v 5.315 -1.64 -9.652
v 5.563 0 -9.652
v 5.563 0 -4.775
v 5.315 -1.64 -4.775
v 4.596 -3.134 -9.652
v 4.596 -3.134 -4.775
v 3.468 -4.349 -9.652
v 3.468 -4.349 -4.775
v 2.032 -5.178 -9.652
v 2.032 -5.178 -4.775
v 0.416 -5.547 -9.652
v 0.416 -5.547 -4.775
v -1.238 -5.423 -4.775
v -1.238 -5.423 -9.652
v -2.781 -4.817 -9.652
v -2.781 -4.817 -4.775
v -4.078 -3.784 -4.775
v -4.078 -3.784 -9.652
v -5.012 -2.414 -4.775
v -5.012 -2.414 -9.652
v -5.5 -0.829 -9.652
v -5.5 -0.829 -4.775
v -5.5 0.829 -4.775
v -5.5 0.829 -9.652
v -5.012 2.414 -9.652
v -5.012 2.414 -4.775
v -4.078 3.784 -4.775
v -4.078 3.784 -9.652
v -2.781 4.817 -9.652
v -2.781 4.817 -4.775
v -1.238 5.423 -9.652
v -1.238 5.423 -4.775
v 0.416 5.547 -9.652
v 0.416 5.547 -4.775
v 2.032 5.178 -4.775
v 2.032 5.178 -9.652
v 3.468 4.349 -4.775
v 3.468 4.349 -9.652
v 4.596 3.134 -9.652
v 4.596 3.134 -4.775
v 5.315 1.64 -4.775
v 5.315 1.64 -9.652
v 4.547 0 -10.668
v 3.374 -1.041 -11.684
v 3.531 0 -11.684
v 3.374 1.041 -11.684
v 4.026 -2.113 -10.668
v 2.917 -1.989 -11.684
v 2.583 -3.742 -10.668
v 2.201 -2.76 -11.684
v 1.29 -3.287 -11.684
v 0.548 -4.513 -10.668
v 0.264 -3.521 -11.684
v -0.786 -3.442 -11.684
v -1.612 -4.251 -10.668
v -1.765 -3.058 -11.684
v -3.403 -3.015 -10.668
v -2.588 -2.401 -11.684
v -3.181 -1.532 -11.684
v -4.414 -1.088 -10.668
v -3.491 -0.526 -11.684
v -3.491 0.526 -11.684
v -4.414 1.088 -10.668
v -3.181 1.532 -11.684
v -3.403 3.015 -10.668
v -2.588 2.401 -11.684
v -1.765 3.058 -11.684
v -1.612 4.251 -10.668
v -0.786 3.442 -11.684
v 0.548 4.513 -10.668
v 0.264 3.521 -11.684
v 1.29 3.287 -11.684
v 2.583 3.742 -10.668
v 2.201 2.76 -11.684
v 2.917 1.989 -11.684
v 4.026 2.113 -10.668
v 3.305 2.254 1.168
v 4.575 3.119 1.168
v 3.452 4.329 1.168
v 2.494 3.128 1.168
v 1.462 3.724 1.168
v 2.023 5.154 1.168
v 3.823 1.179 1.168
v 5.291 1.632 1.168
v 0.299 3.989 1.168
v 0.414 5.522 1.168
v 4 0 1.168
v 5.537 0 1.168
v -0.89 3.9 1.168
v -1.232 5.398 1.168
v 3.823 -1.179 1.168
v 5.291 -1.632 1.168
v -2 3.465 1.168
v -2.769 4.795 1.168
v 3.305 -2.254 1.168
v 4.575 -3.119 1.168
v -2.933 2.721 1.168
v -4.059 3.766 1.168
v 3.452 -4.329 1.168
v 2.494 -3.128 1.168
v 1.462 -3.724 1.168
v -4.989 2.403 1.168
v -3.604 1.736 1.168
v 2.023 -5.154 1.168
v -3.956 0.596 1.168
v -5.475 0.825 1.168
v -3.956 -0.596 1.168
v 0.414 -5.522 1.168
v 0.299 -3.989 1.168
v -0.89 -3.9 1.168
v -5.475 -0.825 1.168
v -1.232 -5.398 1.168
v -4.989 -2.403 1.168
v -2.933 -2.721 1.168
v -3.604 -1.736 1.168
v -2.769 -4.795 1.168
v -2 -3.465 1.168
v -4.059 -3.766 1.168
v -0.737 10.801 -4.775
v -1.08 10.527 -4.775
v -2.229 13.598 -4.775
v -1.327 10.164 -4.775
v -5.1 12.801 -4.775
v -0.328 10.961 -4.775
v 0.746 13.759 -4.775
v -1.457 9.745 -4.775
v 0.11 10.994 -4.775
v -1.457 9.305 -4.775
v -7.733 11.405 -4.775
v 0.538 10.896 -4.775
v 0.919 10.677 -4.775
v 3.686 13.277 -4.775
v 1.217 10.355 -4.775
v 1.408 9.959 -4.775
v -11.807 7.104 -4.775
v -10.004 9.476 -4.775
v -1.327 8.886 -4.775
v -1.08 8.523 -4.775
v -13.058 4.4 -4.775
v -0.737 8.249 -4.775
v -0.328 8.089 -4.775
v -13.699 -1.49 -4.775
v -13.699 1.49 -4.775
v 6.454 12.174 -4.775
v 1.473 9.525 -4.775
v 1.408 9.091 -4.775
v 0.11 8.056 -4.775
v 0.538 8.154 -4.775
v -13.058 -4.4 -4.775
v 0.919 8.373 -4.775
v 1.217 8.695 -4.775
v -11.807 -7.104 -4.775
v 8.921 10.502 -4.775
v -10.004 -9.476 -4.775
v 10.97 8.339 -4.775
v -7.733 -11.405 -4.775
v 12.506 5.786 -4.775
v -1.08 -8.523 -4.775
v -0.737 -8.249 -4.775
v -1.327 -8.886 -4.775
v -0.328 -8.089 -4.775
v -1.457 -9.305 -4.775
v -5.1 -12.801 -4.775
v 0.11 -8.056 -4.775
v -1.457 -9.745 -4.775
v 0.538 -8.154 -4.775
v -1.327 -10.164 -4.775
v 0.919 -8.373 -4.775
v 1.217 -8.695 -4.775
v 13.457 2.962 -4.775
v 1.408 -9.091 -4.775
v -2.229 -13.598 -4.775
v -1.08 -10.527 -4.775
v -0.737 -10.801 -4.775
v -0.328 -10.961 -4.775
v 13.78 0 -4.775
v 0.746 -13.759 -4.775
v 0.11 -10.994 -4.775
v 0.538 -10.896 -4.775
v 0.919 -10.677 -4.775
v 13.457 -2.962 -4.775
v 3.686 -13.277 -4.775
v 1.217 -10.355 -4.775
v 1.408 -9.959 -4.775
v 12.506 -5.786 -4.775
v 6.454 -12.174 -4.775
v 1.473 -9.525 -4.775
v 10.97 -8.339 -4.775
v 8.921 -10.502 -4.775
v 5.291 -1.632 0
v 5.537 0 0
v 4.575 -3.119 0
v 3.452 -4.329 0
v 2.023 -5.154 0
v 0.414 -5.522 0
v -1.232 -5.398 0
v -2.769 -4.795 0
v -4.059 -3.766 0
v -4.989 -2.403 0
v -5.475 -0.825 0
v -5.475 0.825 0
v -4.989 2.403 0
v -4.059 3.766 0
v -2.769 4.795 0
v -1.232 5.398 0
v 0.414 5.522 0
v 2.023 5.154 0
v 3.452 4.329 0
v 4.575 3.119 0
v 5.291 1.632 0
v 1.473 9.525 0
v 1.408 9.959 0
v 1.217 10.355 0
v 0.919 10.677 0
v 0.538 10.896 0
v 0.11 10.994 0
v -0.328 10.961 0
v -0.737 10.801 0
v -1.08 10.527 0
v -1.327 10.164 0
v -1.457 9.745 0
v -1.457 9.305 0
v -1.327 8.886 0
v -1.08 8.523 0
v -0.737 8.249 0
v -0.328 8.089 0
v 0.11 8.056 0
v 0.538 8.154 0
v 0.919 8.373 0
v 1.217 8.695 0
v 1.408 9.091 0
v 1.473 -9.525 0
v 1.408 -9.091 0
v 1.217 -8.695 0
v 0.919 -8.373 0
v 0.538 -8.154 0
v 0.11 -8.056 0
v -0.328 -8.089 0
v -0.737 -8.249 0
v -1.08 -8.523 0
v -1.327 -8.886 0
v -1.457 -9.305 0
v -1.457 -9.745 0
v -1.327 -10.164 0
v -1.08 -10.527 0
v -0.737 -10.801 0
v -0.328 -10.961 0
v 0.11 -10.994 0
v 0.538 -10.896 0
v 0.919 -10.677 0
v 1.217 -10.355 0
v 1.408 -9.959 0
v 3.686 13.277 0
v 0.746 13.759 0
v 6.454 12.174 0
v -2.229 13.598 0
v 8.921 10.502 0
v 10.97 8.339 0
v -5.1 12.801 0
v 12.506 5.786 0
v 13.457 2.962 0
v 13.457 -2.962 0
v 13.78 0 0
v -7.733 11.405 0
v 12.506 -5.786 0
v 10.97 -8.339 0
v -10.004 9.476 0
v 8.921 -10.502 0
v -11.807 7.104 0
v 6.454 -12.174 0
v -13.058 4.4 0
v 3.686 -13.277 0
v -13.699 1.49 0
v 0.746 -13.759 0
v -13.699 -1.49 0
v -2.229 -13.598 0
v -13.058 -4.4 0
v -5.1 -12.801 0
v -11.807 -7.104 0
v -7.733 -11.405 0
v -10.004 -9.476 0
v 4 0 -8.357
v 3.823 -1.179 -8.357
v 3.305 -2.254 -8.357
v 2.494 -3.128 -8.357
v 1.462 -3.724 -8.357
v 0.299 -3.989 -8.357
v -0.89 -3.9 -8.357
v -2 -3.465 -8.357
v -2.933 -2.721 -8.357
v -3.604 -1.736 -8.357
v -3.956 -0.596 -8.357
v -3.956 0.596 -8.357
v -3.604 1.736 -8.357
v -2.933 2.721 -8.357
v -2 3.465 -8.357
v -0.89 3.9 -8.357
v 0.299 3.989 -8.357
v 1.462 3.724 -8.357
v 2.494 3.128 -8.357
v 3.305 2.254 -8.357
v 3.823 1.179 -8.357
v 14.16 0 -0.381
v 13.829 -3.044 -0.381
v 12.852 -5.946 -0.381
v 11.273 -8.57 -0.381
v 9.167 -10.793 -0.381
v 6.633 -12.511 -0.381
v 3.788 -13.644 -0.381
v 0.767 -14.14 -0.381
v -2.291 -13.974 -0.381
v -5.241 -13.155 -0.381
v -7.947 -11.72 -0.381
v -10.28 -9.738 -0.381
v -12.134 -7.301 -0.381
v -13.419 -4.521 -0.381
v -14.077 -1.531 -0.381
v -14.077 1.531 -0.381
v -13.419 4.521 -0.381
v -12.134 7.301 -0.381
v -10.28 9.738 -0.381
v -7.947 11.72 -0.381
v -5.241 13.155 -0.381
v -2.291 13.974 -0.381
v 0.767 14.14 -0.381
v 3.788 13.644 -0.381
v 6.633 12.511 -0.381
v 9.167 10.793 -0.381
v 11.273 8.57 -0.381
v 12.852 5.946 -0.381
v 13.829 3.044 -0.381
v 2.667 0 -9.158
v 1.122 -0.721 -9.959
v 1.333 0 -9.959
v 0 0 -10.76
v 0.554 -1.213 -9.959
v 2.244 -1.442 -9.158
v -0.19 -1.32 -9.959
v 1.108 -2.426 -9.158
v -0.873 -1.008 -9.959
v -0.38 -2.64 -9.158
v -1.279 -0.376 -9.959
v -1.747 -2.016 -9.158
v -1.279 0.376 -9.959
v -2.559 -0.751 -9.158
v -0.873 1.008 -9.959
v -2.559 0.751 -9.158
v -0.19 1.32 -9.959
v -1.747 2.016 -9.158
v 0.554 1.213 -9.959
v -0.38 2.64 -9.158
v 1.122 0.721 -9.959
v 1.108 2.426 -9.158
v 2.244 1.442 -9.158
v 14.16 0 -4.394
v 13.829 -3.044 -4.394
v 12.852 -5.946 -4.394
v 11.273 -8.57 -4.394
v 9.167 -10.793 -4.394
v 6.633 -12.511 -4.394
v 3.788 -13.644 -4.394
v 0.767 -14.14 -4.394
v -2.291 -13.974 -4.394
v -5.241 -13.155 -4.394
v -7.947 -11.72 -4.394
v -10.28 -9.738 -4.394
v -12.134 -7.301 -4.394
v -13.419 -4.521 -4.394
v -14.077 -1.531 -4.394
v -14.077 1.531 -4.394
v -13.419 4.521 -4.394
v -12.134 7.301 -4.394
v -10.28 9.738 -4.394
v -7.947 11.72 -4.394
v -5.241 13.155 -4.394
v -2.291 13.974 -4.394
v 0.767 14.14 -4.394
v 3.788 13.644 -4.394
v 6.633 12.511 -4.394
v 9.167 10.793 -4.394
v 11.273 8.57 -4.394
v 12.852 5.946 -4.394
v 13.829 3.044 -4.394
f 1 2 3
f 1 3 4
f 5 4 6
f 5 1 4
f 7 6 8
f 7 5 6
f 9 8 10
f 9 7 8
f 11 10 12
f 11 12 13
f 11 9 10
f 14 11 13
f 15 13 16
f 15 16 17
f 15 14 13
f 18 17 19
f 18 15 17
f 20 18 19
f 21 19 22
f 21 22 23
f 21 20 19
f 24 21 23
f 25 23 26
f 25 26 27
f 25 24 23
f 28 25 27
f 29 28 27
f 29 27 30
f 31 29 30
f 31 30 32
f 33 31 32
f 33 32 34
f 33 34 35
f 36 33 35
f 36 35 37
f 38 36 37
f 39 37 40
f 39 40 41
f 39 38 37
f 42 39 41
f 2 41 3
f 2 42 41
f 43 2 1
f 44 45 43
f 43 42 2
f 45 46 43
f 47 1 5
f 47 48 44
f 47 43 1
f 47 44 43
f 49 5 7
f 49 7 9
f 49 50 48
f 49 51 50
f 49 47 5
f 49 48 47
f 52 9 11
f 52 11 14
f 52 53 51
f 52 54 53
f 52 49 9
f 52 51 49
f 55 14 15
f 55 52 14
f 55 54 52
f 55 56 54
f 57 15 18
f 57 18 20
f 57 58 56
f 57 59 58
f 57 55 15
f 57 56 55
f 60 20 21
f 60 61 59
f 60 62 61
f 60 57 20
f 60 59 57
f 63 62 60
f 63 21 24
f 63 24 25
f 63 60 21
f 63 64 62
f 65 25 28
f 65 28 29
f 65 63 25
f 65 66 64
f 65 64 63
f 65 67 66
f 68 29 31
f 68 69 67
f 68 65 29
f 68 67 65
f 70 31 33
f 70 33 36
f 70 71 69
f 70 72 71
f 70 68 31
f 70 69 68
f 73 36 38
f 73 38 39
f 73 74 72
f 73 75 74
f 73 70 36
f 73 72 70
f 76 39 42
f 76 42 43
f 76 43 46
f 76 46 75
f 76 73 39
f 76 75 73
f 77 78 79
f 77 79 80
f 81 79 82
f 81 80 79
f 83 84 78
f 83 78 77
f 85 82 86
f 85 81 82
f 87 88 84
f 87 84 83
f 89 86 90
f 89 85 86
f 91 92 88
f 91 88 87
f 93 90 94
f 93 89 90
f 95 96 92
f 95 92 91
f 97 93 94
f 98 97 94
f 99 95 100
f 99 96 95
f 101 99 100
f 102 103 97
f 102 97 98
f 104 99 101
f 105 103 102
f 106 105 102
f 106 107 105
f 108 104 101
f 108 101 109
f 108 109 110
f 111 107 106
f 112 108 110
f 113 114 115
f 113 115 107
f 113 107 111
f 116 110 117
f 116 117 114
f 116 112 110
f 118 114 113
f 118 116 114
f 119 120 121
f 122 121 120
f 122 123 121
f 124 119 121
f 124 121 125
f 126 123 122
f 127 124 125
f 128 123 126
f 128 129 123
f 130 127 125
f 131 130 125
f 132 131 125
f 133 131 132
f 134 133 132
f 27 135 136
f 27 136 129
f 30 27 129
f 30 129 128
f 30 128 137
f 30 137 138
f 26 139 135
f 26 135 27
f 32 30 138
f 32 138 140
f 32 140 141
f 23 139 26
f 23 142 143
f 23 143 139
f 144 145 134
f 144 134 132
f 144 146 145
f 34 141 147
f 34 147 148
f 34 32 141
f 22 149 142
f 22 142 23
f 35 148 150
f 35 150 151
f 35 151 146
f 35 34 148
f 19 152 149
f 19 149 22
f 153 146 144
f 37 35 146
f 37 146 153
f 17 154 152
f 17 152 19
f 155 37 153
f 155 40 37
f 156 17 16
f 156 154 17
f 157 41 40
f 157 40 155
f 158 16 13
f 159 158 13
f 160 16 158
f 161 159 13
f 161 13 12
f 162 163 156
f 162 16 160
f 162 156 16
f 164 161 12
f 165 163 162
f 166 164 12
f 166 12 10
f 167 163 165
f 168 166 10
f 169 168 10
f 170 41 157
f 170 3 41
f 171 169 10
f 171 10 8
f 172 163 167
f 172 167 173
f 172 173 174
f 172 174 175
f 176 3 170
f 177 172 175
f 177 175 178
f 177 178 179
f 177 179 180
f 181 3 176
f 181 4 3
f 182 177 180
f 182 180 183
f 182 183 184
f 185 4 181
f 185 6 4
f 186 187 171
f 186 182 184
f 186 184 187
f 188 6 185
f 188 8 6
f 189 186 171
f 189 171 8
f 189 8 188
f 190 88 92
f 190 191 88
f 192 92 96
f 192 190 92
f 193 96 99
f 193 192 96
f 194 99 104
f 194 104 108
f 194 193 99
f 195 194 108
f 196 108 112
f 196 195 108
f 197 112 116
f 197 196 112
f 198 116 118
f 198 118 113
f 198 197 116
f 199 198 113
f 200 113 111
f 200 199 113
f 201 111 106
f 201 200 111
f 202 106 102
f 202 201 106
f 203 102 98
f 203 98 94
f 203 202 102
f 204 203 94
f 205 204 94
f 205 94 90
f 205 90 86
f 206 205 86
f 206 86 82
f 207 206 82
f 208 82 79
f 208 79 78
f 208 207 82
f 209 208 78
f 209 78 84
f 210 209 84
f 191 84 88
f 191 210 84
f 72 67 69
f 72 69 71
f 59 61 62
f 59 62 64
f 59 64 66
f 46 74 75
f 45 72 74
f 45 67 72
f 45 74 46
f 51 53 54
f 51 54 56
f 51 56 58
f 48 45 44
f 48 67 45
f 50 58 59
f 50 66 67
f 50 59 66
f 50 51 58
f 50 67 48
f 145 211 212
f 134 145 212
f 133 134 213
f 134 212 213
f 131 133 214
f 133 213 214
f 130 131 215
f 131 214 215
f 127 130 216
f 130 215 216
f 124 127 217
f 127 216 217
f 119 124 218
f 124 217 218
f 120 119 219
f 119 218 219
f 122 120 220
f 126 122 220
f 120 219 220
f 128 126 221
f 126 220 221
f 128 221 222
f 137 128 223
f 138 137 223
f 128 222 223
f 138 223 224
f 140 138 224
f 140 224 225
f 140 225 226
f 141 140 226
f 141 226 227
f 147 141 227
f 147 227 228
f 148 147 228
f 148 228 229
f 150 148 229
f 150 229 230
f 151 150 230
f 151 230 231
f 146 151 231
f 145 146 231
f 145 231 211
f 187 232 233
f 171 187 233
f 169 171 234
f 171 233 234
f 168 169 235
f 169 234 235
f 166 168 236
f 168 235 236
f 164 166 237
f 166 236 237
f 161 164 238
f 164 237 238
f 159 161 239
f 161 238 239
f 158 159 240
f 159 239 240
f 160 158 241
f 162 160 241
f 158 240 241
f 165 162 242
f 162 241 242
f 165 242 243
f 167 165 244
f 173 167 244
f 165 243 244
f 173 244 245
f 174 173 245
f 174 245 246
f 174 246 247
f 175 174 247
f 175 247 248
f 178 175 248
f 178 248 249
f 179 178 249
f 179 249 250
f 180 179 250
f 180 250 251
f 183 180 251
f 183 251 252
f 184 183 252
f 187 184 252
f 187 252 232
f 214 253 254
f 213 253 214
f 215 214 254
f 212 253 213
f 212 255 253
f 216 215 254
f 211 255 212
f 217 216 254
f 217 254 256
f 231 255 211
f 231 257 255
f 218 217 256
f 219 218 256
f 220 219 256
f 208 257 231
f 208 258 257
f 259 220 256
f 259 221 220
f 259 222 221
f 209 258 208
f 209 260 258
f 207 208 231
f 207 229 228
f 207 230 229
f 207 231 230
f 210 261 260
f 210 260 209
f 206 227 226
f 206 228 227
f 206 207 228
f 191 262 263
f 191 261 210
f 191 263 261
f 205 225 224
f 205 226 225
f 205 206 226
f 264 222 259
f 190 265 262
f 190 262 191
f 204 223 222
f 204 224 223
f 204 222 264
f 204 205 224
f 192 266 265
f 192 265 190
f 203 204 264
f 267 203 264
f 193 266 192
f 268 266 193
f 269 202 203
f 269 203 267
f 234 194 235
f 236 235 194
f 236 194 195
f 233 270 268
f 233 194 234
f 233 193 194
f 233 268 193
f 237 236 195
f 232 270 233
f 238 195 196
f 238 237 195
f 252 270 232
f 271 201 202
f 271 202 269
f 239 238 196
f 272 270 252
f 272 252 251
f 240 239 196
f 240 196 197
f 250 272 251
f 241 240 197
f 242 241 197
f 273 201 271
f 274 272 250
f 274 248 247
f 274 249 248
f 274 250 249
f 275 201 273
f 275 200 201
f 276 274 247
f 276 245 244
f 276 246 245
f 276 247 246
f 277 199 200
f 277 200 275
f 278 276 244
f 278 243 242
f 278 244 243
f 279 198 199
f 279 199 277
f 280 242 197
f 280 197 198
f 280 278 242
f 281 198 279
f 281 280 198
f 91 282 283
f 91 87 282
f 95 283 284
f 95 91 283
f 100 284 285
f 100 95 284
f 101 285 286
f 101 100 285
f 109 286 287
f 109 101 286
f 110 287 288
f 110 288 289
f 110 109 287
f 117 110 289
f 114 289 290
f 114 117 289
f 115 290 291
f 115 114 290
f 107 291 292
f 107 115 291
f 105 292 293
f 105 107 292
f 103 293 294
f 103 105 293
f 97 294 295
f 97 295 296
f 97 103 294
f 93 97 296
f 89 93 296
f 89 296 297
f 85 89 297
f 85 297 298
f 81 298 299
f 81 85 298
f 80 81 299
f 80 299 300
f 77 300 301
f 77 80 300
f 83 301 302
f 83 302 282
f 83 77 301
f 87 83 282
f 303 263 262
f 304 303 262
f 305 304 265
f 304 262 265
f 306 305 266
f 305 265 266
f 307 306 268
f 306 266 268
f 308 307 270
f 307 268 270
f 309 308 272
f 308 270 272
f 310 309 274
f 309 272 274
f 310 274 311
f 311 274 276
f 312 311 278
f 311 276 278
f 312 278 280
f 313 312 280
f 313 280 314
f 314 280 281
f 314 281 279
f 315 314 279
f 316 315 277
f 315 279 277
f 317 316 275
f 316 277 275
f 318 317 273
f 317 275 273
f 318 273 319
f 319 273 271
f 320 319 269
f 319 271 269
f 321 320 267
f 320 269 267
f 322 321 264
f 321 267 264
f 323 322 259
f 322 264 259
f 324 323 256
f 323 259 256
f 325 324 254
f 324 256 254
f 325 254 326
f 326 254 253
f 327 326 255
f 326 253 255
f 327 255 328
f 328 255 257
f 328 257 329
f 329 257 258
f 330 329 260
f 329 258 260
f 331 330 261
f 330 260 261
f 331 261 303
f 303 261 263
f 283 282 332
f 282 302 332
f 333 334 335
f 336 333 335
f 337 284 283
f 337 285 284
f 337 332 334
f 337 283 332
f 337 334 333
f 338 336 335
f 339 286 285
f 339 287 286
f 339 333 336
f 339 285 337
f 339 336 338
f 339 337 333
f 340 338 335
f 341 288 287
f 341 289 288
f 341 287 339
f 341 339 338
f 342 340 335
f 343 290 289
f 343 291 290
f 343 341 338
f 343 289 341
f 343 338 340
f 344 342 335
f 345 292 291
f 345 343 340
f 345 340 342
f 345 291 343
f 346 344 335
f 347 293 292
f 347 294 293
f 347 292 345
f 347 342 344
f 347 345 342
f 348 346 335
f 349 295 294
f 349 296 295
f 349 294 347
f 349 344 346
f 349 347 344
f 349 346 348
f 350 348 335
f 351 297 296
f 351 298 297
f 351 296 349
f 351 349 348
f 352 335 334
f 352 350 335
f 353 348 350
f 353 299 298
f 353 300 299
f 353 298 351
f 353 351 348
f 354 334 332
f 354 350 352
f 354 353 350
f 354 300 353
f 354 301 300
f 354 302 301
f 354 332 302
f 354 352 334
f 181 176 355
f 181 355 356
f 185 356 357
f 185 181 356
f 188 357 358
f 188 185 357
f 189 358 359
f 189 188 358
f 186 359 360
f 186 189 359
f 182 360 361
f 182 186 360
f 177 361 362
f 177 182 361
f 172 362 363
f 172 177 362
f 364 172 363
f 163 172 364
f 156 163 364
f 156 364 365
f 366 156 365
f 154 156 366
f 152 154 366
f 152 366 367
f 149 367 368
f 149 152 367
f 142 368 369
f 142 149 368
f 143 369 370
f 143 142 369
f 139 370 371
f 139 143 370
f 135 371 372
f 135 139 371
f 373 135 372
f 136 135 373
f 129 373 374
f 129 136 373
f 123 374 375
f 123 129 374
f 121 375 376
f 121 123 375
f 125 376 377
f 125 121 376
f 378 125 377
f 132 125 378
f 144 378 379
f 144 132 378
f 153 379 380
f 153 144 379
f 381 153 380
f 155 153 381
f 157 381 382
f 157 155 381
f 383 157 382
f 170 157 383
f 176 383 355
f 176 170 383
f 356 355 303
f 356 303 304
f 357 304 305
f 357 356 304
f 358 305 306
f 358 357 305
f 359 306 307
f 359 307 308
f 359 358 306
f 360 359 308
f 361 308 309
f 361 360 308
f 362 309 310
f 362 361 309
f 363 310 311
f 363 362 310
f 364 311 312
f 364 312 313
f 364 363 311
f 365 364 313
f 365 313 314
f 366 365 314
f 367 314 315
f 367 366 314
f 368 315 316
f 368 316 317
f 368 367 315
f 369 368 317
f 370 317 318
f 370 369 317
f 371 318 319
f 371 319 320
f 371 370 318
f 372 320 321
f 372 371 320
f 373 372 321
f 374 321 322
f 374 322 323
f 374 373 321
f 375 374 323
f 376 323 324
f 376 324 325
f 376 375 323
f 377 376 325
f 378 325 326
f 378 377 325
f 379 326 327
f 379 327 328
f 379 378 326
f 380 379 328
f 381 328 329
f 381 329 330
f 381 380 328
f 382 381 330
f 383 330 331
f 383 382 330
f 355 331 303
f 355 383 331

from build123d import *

# Parameters (mm, degrees)
CHAMFER1_SIZE               = 0.381
F_32_0_116_DIAMETER_HOLE1_D = 2.9464
CHAMFER2_SIZE               = 2.032


with BuildPart() as part:
    # Sketch1 → Revolve1 (revolve)
    with BuildSketch(Plane(origin=(0, 0, 0), x_dir=(0, 0, -1), z_dir=(1, 0, 0)), mode=Mode.PRIVATE) as revolve1_sk:
        Polygon((0, 14.1605), (4.7752, 14.1605), (4.7752, 5.5626), (11.684, 5.5626), (11.684, 0), (10.760342906, 0), (8.3566, 4.0005), (-1.1684, 4.0005), (-1.1684, 5.5372), (0, 5.5372), align=None)
    revolve(revolve1_sk.sketch.rotate(Axis((0, 0, -14.800465311), (0, 0, -1)), 90), axis=Axis((0, 0, -14.800465311), (0, 0, -1)))

    # Chamfer1
    chamfer1_edges = [part.edges().sort_by_distance(p)[0] for p in [
        (-14.1605, 0, -4.7752),
        (-14.1605, 0, 0),
    ]]
    chamfer(chamfer1_edges, length=CHAMFER1_SIZE)

    # #32 (0.116) Diameter Hole1 (through all)
    with Locations(Plane(origin=(0, 0, -4.7752), x_dir=(-1, 0, 0), z_dir=(0, 0, -1))):
        with Locations((0, 9.525), (0, -9.525)):
            Hole(F_32_0_116_DIAMETER_HOLE1_D / 2)

    # Chamfer2
    chamfer2_edges = [part.edges().sort_by_distance(p)[0] for p in [
        (-5.5626, 0, -11.684),
    ]]
    chamfer(chamfer2_edges, length=CHAMFER2_SIZE)


solid = part.part
